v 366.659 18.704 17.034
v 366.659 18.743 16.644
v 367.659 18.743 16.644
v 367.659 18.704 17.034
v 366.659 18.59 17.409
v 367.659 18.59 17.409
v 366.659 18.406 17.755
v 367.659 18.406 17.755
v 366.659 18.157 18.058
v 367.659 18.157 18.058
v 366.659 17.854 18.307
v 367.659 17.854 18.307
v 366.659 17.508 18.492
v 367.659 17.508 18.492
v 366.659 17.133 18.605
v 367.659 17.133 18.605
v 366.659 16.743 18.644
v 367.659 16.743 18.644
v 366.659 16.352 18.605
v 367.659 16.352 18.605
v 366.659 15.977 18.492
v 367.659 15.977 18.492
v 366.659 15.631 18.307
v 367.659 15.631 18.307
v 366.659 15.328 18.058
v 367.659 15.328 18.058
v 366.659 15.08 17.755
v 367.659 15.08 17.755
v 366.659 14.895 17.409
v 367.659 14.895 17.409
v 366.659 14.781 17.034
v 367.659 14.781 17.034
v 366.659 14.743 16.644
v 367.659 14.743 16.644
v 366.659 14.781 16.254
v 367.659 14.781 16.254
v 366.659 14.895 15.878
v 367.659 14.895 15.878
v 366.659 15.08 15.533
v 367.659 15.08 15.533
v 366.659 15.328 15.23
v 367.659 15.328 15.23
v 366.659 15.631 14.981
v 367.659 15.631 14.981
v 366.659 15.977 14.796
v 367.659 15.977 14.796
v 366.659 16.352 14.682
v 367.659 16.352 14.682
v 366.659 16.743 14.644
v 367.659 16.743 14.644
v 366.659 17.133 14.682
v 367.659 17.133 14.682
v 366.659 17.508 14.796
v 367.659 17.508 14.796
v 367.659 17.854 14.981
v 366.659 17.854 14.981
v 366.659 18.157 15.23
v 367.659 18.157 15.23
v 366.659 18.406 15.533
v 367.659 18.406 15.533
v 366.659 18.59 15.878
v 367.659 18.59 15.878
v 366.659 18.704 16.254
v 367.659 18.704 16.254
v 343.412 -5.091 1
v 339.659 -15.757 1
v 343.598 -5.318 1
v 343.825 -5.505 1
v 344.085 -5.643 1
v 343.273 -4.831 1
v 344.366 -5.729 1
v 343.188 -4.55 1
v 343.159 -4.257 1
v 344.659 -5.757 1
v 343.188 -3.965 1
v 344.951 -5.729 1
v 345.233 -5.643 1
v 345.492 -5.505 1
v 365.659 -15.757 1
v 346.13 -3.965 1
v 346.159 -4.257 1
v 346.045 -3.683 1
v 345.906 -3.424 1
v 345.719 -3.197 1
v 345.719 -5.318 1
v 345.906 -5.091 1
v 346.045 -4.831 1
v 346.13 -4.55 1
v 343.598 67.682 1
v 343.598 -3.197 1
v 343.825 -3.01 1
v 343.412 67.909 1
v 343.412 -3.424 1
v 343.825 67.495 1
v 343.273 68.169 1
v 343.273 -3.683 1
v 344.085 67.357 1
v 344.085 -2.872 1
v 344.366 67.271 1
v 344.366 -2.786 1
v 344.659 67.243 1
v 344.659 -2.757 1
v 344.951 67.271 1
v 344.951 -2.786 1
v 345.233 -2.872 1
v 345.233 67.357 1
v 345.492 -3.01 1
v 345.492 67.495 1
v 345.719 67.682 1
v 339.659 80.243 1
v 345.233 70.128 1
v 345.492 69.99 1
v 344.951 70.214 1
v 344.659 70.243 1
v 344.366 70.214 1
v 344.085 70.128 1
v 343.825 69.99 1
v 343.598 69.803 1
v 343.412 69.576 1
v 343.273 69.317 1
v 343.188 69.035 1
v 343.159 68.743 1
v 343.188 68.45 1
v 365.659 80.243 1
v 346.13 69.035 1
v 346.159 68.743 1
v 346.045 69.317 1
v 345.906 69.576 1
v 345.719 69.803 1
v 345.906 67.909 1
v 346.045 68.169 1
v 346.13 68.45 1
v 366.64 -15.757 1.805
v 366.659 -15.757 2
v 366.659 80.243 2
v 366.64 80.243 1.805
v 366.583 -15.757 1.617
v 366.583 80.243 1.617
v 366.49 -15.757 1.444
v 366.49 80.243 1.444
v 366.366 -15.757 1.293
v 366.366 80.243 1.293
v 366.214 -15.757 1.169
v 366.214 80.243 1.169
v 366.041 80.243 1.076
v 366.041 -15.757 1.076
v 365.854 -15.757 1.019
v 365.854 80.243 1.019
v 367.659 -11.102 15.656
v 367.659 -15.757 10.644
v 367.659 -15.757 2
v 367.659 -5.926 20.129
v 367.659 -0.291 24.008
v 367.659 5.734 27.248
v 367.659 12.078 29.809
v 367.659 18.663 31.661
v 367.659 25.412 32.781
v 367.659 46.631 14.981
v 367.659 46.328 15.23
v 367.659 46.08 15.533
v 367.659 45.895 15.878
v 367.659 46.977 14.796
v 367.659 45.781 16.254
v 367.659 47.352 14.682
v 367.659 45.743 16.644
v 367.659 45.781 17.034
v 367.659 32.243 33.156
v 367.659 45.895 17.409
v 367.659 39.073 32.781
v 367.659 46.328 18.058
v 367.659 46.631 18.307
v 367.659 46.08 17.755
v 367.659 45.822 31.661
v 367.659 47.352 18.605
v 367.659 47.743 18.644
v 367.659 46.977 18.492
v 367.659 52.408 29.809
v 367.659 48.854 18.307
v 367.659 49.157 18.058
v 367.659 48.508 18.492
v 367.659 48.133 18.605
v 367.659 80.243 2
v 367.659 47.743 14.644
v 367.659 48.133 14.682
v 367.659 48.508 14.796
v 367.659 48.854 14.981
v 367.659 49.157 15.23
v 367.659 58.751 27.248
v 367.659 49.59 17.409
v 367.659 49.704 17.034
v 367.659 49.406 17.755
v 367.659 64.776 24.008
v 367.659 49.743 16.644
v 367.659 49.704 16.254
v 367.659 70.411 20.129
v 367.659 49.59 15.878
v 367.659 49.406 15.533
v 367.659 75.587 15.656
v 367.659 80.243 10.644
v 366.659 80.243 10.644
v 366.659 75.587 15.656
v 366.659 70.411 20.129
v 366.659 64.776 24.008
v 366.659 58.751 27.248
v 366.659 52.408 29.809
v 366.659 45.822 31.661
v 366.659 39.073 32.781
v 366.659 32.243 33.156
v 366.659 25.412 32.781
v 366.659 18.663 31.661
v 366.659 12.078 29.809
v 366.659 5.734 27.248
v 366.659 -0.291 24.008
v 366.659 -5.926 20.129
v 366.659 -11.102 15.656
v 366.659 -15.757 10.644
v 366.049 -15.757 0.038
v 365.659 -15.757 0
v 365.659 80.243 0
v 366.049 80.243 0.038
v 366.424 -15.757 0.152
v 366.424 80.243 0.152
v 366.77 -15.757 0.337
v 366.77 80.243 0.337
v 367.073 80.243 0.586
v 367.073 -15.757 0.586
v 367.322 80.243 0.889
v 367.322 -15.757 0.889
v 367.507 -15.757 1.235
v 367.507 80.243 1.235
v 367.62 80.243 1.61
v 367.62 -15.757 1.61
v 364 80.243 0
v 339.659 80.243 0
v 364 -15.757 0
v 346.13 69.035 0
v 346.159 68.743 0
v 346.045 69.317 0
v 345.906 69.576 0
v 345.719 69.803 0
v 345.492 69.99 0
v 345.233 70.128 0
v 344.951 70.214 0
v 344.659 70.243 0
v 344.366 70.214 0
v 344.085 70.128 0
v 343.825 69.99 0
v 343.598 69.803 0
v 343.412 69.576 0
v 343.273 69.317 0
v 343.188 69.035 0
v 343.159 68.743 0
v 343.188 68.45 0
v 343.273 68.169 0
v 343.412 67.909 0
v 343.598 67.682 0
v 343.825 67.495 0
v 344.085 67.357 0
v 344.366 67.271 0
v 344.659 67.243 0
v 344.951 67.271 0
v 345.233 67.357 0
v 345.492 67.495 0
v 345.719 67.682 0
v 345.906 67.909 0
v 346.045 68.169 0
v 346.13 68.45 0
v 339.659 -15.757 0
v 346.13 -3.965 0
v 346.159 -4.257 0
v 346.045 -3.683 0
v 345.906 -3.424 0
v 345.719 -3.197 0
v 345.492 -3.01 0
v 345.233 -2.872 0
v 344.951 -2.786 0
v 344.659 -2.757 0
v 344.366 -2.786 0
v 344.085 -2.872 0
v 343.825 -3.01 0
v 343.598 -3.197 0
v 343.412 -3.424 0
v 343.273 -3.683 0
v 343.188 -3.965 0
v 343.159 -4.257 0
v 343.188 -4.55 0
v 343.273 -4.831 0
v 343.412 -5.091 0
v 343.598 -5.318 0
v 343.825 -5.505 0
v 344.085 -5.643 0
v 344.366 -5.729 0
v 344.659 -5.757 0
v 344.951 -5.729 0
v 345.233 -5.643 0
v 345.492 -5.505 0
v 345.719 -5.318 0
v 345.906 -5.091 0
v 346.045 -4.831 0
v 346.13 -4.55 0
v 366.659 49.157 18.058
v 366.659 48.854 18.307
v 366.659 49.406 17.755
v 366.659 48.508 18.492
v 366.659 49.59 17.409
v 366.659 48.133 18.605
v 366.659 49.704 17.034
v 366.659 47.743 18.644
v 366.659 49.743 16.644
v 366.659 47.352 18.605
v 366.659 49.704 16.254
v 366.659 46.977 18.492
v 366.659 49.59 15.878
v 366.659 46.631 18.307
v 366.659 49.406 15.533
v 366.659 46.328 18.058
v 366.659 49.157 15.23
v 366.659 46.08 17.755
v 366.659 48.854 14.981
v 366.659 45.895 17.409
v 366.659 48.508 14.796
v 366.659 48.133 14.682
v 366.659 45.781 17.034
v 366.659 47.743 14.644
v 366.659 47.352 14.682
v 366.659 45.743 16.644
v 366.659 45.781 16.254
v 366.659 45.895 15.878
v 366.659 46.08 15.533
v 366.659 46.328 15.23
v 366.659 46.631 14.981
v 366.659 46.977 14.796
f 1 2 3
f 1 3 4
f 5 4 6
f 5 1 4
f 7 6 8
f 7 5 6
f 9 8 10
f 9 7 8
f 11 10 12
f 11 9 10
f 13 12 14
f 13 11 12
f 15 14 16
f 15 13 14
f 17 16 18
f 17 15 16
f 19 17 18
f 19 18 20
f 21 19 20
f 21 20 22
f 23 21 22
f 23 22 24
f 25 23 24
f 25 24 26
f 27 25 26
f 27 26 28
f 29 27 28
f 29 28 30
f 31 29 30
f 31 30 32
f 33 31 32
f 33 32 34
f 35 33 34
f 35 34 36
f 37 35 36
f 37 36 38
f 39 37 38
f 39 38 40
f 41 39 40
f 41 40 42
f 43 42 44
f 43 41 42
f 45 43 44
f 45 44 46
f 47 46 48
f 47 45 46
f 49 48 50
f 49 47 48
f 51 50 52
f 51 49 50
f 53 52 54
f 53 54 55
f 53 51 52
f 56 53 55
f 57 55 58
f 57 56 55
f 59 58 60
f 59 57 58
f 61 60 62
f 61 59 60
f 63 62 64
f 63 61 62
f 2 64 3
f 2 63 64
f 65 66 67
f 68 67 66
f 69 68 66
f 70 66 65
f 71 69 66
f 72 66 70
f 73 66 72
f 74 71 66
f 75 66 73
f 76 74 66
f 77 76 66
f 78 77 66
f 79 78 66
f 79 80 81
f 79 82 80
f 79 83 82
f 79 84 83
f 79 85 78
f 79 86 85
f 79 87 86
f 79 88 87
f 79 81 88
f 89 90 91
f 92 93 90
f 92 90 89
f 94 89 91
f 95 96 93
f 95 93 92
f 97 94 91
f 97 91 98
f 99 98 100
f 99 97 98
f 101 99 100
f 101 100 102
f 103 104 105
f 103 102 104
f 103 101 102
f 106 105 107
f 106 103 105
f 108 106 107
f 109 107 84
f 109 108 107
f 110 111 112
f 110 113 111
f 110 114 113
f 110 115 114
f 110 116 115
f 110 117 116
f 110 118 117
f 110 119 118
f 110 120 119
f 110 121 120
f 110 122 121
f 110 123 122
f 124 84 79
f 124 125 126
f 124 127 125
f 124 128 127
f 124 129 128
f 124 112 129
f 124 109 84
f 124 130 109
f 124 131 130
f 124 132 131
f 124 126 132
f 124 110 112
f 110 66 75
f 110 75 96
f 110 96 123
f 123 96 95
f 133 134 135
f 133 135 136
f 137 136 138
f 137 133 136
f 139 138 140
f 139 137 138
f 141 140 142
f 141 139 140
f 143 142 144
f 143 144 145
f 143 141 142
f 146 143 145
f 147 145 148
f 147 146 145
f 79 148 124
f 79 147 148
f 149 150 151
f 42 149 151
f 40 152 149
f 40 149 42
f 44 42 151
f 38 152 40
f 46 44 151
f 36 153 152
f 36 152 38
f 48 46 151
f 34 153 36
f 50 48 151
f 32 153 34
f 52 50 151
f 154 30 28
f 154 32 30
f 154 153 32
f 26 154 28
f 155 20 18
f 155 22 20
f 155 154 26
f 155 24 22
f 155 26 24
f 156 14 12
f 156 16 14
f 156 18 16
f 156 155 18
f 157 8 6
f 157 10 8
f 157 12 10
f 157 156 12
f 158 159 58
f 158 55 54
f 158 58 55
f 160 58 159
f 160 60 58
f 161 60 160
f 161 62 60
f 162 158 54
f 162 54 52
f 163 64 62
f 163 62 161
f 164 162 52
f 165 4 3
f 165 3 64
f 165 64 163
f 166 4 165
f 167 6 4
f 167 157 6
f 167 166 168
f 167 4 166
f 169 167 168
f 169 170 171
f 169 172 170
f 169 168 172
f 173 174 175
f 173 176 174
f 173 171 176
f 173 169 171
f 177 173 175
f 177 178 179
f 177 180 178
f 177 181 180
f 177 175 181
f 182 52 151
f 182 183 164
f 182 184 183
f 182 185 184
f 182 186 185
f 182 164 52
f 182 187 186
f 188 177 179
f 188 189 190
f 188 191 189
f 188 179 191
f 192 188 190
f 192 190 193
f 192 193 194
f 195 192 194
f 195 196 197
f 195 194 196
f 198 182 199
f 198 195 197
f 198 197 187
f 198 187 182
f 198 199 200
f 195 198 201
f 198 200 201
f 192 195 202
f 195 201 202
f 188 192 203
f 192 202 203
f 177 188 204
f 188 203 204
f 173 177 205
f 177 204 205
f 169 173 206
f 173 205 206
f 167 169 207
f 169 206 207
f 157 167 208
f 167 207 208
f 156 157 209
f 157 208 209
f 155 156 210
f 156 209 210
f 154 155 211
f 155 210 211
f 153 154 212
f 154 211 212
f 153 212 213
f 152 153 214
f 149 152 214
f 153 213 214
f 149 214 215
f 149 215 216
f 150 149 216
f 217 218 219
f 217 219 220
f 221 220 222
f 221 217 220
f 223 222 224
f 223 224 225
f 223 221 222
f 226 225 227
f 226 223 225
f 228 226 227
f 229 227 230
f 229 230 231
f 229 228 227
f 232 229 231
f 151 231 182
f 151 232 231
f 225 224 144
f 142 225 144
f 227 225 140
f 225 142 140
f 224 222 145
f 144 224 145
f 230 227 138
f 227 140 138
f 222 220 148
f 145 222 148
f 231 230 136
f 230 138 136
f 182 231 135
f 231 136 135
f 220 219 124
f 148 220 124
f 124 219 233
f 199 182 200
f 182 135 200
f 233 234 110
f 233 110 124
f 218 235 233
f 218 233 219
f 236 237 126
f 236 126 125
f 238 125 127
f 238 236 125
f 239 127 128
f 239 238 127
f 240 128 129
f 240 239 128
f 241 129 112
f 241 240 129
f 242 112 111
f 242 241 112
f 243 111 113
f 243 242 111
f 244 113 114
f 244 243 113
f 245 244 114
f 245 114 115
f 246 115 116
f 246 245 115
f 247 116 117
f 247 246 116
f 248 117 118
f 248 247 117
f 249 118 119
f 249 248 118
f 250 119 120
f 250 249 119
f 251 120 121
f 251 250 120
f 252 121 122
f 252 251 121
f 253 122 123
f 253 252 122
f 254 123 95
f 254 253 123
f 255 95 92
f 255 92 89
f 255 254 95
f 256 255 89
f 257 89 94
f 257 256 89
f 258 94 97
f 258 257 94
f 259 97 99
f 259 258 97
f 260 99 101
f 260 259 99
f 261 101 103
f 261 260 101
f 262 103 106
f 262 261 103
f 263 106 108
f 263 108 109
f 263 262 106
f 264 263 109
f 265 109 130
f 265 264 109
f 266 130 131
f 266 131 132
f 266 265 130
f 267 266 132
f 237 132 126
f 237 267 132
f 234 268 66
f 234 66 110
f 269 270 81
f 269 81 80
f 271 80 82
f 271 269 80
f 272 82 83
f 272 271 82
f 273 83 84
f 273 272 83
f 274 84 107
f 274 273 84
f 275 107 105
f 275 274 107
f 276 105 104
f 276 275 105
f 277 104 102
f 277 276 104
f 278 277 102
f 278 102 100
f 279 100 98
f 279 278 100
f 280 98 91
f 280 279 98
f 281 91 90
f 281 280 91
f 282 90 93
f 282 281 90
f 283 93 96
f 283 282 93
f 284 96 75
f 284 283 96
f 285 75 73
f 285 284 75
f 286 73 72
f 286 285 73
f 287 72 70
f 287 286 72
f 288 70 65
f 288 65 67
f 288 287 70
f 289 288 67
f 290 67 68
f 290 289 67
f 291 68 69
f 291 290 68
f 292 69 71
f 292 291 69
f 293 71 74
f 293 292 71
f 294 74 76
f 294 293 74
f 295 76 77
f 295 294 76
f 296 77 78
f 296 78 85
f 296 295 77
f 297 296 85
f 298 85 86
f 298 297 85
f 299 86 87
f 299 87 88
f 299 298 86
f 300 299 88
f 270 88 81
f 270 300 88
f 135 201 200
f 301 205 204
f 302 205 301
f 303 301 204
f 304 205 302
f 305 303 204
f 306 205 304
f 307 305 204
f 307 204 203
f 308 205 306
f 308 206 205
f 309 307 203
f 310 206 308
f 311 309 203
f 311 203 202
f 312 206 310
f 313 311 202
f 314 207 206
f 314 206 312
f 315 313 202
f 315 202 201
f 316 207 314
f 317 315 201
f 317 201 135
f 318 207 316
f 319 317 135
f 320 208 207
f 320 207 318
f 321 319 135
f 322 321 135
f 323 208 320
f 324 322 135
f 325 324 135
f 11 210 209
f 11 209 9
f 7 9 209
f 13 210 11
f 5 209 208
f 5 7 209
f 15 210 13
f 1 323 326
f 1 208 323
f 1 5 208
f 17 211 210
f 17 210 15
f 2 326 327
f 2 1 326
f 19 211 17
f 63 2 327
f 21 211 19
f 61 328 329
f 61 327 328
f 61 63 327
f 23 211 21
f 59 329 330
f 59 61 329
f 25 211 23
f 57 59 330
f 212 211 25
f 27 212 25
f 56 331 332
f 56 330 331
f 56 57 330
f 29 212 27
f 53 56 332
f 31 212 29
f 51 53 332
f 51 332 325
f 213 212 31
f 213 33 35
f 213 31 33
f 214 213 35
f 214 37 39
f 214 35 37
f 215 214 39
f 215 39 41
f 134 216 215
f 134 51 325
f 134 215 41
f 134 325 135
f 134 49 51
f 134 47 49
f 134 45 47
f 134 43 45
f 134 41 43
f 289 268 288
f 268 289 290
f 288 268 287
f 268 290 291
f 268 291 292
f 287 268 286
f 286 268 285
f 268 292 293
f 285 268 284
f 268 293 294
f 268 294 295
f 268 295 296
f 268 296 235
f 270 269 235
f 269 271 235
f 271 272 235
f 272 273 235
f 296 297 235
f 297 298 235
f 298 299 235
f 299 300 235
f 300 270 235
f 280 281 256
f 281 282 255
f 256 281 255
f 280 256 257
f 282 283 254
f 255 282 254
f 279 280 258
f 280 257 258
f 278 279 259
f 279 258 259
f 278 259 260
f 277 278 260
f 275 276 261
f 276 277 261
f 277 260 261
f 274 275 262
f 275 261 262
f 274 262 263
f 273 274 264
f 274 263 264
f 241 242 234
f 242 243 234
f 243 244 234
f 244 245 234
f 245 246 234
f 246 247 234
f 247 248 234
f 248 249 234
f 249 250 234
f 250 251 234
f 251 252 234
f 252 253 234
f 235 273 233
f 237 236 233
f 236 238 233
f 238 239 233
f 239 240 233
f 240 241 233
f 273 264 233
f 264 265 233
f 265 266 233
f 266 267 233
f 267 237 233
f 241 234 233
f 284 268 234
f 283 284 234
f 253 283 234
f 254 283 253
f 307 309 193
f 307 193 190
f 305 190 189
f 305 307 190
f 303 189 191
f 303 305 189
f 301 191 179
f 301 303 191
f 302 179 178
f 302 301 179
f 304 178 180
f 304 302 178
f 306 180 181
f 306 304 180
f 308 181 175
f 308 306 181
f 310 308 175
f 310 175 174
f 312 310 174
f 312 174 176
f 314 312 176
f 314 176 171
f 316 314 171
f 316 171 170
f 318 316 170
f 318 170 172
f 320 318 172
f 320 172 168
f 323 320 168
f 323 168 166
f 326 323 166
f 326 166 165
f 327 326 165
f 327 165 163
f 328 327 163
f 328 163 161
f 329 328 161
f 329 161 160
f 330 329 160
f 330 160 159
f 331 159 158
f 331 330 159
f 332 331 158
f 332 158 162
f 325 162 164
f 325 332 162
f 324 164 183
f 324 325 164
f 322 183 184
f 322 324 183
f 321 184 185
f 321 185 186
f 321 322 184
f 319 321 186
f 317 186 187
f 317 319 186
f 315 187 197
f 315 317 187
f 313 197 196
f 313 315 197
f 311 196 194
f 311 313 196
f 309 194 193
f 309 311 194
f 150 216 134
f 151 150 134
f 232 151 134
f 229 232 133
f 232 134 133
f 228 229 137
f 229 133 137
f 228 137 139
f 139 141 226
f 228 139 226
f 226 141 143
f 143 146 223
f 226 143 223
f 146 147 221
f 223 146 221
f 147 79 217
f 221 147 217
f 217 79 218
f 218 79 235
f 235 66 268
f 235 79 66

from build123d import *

# Parameters (mm, degrees)
IZIM1_W                     = 27
IZIM1_H                     = 96
IZIM1_R                     = 1.5
IZIM1_R_2                   = 2
Y_KSEKLIK_EKSTR_ZYON1_DEPTH = 1
IZGIDEN_START               = 367.447539798
IZGIDEN_B_KME1_OUTLINE_W    = 96
IZGIDEN_B_KME1_OUTLINE_H    = 1
IZGIDEN_B_KME1_DEPTH        = 32.552460202
IZGIDEN_START_2             = 365.658779798
IZGIDEN_B_KME1_2_OUTLINE_R  = 2
IZGIDEN_B_KME1_2_DEPTH      = 2
IZGIDEN_START_3             = -15.757423971
IZGIDEN_B_KME1_3_DEPTH      = 96


with BuildPart() as part:
    # Çizim1 → Yükseklik-Ekstrüzyon1 (new body)
    # profile 1 of 2: a face of its own
    with BuildSketch(Plane.XY):
        with Locations((353.158779798, 32.242576029)):
            Rectangle(IZIM1_W, IZIM1_H)
        with Locations((344.658779798, -4.257423971)):
            Circle(IZIM1_R, mode=Mode.SUBTRACT)
        with Locations((344.658779798, 68.742576029)):
            Circle(IZIM1_R, mode=Mode.SUBTRACT)
    # profile 2 of 2: a face of its own
    with BuildSketch(Plane.XY):
        with BuildLine():
            Line((376.658779798, 80.242576029), (366.658779798, 80.242576029))
            Line((366.658779798, 80.242576029), (366.658779798, -15.757423971))
            Line((366.658779798, -15.757423971), (376.658779798, -15.757423971))
            ThreePointArc((376.658779798, -15.757423971), (399.170626089, 32.242576029), (376.658779798, 80.242576029))
        make_face()
        with Locations((382.658779798, 16.742576029)):
            Circle(IZIM1_R_2, mode=Mode.SUBTRACT)
        with Locations((382.658779798, 47.742576029)):
            Circle(IZIM1_R_2, mode=Mode.SUBTRACT)
    extrude(amount=Y_KSEKLIK_EKSTR_ZYON1_DEPTH)

    # Çizgiden Bükme1: read off the stored shape, not the designer's step
    # Çizgiden Bükme1 outline → Çizgiden Bükme1 (cut)
    with BuildSketch(Plane.YZ.offset(IZGIDEN_START)):
        with Locations((32.242576029, 0.5)):
            Rectangle(IZGIDEN_B_KME1_OUTLINE_W, IZGIDEN_B_KME1_OUTLINE_H)
    extrude(amount=IZGIDEN_B_KME1_DEPTH, mode=Mode.SUBTRACT)

    # izgiden B_kme1 2 outline → izgiden B_kme1 2 (add)
    with BuildSketch(Plane.YZ.offset(IZGIDEN_START_2)):
        with BuildLine():
            Line((80.242576029, 1), (80.242576029, 10.64380551))
            ThreePointArc((80.242576029, 10.64380551), (32.242576029, 33.155651801), (-15.757423971, 10.64380551))
            Line((-15.757423971, 10.64380551), (-15.757423971, 1))
            Line((-15.757423971, 1), (80.242576029, 1))
        make_face()
        with Locations((16.742576029, 16.64380551)):
            Circle(IZGIDEN_B_KME1_2_OUTLINE_R, mode=Mode.SUBTRACT)
        with Locations((47.742576029, 16.64380551)):
            Circle(IZGIDEN_B_KME1_2_OUTLINE_R, mode=Mode.SUBTRACT)
    extrude(amount=IZGIDEN_B_KME1_2_DEPTH)

    # izgiden B_kme1 3 outline → izgiden B_kme1 3 (cut)
    with BuildSketch(Plane(origin=(0, 0, 0), x_dir=(1, 0, 0), z_dir=(0, 1, 0)).offset(IZGIDEN_START_3)):
        with BuildLine():
            Line((366.658779798, -35), (366.658779798, -2))
            ThreePointArc((366.658779798, -2), (366.365886579, -1.292893219), (365.658779798, -1))
            Line((365.658779798, -1), (365.658779798, -35))
            Line((365.658779798, -35), (366.658779798, -35))
        make_face()
        with BuildLine():
            Line((367.658779798, -2), (367.658779819, -35))
            Line((367.658779819, -35), (369, -35))
            Line((369, -35), (369, -1))
            Line((369, -1), (367.447539798, -1))
            Line((367.447539798, -1), (367.447539798, 1))
            Line((367.447539798, 1), (364, 1))
            Line((364, 1), (364, 1e-09))
            Line((364, 1e-09), (365.658779798, 0))
            ThreePointArc((365.658779798, 0), (367.07299336, -0.585786438), (367.658779798, -2))
        make_face()
    extrude(amount=IZGIDEN_B_KME1_3_DEPTH, mode=Mode.SUBTRACT)


solid = part.part
